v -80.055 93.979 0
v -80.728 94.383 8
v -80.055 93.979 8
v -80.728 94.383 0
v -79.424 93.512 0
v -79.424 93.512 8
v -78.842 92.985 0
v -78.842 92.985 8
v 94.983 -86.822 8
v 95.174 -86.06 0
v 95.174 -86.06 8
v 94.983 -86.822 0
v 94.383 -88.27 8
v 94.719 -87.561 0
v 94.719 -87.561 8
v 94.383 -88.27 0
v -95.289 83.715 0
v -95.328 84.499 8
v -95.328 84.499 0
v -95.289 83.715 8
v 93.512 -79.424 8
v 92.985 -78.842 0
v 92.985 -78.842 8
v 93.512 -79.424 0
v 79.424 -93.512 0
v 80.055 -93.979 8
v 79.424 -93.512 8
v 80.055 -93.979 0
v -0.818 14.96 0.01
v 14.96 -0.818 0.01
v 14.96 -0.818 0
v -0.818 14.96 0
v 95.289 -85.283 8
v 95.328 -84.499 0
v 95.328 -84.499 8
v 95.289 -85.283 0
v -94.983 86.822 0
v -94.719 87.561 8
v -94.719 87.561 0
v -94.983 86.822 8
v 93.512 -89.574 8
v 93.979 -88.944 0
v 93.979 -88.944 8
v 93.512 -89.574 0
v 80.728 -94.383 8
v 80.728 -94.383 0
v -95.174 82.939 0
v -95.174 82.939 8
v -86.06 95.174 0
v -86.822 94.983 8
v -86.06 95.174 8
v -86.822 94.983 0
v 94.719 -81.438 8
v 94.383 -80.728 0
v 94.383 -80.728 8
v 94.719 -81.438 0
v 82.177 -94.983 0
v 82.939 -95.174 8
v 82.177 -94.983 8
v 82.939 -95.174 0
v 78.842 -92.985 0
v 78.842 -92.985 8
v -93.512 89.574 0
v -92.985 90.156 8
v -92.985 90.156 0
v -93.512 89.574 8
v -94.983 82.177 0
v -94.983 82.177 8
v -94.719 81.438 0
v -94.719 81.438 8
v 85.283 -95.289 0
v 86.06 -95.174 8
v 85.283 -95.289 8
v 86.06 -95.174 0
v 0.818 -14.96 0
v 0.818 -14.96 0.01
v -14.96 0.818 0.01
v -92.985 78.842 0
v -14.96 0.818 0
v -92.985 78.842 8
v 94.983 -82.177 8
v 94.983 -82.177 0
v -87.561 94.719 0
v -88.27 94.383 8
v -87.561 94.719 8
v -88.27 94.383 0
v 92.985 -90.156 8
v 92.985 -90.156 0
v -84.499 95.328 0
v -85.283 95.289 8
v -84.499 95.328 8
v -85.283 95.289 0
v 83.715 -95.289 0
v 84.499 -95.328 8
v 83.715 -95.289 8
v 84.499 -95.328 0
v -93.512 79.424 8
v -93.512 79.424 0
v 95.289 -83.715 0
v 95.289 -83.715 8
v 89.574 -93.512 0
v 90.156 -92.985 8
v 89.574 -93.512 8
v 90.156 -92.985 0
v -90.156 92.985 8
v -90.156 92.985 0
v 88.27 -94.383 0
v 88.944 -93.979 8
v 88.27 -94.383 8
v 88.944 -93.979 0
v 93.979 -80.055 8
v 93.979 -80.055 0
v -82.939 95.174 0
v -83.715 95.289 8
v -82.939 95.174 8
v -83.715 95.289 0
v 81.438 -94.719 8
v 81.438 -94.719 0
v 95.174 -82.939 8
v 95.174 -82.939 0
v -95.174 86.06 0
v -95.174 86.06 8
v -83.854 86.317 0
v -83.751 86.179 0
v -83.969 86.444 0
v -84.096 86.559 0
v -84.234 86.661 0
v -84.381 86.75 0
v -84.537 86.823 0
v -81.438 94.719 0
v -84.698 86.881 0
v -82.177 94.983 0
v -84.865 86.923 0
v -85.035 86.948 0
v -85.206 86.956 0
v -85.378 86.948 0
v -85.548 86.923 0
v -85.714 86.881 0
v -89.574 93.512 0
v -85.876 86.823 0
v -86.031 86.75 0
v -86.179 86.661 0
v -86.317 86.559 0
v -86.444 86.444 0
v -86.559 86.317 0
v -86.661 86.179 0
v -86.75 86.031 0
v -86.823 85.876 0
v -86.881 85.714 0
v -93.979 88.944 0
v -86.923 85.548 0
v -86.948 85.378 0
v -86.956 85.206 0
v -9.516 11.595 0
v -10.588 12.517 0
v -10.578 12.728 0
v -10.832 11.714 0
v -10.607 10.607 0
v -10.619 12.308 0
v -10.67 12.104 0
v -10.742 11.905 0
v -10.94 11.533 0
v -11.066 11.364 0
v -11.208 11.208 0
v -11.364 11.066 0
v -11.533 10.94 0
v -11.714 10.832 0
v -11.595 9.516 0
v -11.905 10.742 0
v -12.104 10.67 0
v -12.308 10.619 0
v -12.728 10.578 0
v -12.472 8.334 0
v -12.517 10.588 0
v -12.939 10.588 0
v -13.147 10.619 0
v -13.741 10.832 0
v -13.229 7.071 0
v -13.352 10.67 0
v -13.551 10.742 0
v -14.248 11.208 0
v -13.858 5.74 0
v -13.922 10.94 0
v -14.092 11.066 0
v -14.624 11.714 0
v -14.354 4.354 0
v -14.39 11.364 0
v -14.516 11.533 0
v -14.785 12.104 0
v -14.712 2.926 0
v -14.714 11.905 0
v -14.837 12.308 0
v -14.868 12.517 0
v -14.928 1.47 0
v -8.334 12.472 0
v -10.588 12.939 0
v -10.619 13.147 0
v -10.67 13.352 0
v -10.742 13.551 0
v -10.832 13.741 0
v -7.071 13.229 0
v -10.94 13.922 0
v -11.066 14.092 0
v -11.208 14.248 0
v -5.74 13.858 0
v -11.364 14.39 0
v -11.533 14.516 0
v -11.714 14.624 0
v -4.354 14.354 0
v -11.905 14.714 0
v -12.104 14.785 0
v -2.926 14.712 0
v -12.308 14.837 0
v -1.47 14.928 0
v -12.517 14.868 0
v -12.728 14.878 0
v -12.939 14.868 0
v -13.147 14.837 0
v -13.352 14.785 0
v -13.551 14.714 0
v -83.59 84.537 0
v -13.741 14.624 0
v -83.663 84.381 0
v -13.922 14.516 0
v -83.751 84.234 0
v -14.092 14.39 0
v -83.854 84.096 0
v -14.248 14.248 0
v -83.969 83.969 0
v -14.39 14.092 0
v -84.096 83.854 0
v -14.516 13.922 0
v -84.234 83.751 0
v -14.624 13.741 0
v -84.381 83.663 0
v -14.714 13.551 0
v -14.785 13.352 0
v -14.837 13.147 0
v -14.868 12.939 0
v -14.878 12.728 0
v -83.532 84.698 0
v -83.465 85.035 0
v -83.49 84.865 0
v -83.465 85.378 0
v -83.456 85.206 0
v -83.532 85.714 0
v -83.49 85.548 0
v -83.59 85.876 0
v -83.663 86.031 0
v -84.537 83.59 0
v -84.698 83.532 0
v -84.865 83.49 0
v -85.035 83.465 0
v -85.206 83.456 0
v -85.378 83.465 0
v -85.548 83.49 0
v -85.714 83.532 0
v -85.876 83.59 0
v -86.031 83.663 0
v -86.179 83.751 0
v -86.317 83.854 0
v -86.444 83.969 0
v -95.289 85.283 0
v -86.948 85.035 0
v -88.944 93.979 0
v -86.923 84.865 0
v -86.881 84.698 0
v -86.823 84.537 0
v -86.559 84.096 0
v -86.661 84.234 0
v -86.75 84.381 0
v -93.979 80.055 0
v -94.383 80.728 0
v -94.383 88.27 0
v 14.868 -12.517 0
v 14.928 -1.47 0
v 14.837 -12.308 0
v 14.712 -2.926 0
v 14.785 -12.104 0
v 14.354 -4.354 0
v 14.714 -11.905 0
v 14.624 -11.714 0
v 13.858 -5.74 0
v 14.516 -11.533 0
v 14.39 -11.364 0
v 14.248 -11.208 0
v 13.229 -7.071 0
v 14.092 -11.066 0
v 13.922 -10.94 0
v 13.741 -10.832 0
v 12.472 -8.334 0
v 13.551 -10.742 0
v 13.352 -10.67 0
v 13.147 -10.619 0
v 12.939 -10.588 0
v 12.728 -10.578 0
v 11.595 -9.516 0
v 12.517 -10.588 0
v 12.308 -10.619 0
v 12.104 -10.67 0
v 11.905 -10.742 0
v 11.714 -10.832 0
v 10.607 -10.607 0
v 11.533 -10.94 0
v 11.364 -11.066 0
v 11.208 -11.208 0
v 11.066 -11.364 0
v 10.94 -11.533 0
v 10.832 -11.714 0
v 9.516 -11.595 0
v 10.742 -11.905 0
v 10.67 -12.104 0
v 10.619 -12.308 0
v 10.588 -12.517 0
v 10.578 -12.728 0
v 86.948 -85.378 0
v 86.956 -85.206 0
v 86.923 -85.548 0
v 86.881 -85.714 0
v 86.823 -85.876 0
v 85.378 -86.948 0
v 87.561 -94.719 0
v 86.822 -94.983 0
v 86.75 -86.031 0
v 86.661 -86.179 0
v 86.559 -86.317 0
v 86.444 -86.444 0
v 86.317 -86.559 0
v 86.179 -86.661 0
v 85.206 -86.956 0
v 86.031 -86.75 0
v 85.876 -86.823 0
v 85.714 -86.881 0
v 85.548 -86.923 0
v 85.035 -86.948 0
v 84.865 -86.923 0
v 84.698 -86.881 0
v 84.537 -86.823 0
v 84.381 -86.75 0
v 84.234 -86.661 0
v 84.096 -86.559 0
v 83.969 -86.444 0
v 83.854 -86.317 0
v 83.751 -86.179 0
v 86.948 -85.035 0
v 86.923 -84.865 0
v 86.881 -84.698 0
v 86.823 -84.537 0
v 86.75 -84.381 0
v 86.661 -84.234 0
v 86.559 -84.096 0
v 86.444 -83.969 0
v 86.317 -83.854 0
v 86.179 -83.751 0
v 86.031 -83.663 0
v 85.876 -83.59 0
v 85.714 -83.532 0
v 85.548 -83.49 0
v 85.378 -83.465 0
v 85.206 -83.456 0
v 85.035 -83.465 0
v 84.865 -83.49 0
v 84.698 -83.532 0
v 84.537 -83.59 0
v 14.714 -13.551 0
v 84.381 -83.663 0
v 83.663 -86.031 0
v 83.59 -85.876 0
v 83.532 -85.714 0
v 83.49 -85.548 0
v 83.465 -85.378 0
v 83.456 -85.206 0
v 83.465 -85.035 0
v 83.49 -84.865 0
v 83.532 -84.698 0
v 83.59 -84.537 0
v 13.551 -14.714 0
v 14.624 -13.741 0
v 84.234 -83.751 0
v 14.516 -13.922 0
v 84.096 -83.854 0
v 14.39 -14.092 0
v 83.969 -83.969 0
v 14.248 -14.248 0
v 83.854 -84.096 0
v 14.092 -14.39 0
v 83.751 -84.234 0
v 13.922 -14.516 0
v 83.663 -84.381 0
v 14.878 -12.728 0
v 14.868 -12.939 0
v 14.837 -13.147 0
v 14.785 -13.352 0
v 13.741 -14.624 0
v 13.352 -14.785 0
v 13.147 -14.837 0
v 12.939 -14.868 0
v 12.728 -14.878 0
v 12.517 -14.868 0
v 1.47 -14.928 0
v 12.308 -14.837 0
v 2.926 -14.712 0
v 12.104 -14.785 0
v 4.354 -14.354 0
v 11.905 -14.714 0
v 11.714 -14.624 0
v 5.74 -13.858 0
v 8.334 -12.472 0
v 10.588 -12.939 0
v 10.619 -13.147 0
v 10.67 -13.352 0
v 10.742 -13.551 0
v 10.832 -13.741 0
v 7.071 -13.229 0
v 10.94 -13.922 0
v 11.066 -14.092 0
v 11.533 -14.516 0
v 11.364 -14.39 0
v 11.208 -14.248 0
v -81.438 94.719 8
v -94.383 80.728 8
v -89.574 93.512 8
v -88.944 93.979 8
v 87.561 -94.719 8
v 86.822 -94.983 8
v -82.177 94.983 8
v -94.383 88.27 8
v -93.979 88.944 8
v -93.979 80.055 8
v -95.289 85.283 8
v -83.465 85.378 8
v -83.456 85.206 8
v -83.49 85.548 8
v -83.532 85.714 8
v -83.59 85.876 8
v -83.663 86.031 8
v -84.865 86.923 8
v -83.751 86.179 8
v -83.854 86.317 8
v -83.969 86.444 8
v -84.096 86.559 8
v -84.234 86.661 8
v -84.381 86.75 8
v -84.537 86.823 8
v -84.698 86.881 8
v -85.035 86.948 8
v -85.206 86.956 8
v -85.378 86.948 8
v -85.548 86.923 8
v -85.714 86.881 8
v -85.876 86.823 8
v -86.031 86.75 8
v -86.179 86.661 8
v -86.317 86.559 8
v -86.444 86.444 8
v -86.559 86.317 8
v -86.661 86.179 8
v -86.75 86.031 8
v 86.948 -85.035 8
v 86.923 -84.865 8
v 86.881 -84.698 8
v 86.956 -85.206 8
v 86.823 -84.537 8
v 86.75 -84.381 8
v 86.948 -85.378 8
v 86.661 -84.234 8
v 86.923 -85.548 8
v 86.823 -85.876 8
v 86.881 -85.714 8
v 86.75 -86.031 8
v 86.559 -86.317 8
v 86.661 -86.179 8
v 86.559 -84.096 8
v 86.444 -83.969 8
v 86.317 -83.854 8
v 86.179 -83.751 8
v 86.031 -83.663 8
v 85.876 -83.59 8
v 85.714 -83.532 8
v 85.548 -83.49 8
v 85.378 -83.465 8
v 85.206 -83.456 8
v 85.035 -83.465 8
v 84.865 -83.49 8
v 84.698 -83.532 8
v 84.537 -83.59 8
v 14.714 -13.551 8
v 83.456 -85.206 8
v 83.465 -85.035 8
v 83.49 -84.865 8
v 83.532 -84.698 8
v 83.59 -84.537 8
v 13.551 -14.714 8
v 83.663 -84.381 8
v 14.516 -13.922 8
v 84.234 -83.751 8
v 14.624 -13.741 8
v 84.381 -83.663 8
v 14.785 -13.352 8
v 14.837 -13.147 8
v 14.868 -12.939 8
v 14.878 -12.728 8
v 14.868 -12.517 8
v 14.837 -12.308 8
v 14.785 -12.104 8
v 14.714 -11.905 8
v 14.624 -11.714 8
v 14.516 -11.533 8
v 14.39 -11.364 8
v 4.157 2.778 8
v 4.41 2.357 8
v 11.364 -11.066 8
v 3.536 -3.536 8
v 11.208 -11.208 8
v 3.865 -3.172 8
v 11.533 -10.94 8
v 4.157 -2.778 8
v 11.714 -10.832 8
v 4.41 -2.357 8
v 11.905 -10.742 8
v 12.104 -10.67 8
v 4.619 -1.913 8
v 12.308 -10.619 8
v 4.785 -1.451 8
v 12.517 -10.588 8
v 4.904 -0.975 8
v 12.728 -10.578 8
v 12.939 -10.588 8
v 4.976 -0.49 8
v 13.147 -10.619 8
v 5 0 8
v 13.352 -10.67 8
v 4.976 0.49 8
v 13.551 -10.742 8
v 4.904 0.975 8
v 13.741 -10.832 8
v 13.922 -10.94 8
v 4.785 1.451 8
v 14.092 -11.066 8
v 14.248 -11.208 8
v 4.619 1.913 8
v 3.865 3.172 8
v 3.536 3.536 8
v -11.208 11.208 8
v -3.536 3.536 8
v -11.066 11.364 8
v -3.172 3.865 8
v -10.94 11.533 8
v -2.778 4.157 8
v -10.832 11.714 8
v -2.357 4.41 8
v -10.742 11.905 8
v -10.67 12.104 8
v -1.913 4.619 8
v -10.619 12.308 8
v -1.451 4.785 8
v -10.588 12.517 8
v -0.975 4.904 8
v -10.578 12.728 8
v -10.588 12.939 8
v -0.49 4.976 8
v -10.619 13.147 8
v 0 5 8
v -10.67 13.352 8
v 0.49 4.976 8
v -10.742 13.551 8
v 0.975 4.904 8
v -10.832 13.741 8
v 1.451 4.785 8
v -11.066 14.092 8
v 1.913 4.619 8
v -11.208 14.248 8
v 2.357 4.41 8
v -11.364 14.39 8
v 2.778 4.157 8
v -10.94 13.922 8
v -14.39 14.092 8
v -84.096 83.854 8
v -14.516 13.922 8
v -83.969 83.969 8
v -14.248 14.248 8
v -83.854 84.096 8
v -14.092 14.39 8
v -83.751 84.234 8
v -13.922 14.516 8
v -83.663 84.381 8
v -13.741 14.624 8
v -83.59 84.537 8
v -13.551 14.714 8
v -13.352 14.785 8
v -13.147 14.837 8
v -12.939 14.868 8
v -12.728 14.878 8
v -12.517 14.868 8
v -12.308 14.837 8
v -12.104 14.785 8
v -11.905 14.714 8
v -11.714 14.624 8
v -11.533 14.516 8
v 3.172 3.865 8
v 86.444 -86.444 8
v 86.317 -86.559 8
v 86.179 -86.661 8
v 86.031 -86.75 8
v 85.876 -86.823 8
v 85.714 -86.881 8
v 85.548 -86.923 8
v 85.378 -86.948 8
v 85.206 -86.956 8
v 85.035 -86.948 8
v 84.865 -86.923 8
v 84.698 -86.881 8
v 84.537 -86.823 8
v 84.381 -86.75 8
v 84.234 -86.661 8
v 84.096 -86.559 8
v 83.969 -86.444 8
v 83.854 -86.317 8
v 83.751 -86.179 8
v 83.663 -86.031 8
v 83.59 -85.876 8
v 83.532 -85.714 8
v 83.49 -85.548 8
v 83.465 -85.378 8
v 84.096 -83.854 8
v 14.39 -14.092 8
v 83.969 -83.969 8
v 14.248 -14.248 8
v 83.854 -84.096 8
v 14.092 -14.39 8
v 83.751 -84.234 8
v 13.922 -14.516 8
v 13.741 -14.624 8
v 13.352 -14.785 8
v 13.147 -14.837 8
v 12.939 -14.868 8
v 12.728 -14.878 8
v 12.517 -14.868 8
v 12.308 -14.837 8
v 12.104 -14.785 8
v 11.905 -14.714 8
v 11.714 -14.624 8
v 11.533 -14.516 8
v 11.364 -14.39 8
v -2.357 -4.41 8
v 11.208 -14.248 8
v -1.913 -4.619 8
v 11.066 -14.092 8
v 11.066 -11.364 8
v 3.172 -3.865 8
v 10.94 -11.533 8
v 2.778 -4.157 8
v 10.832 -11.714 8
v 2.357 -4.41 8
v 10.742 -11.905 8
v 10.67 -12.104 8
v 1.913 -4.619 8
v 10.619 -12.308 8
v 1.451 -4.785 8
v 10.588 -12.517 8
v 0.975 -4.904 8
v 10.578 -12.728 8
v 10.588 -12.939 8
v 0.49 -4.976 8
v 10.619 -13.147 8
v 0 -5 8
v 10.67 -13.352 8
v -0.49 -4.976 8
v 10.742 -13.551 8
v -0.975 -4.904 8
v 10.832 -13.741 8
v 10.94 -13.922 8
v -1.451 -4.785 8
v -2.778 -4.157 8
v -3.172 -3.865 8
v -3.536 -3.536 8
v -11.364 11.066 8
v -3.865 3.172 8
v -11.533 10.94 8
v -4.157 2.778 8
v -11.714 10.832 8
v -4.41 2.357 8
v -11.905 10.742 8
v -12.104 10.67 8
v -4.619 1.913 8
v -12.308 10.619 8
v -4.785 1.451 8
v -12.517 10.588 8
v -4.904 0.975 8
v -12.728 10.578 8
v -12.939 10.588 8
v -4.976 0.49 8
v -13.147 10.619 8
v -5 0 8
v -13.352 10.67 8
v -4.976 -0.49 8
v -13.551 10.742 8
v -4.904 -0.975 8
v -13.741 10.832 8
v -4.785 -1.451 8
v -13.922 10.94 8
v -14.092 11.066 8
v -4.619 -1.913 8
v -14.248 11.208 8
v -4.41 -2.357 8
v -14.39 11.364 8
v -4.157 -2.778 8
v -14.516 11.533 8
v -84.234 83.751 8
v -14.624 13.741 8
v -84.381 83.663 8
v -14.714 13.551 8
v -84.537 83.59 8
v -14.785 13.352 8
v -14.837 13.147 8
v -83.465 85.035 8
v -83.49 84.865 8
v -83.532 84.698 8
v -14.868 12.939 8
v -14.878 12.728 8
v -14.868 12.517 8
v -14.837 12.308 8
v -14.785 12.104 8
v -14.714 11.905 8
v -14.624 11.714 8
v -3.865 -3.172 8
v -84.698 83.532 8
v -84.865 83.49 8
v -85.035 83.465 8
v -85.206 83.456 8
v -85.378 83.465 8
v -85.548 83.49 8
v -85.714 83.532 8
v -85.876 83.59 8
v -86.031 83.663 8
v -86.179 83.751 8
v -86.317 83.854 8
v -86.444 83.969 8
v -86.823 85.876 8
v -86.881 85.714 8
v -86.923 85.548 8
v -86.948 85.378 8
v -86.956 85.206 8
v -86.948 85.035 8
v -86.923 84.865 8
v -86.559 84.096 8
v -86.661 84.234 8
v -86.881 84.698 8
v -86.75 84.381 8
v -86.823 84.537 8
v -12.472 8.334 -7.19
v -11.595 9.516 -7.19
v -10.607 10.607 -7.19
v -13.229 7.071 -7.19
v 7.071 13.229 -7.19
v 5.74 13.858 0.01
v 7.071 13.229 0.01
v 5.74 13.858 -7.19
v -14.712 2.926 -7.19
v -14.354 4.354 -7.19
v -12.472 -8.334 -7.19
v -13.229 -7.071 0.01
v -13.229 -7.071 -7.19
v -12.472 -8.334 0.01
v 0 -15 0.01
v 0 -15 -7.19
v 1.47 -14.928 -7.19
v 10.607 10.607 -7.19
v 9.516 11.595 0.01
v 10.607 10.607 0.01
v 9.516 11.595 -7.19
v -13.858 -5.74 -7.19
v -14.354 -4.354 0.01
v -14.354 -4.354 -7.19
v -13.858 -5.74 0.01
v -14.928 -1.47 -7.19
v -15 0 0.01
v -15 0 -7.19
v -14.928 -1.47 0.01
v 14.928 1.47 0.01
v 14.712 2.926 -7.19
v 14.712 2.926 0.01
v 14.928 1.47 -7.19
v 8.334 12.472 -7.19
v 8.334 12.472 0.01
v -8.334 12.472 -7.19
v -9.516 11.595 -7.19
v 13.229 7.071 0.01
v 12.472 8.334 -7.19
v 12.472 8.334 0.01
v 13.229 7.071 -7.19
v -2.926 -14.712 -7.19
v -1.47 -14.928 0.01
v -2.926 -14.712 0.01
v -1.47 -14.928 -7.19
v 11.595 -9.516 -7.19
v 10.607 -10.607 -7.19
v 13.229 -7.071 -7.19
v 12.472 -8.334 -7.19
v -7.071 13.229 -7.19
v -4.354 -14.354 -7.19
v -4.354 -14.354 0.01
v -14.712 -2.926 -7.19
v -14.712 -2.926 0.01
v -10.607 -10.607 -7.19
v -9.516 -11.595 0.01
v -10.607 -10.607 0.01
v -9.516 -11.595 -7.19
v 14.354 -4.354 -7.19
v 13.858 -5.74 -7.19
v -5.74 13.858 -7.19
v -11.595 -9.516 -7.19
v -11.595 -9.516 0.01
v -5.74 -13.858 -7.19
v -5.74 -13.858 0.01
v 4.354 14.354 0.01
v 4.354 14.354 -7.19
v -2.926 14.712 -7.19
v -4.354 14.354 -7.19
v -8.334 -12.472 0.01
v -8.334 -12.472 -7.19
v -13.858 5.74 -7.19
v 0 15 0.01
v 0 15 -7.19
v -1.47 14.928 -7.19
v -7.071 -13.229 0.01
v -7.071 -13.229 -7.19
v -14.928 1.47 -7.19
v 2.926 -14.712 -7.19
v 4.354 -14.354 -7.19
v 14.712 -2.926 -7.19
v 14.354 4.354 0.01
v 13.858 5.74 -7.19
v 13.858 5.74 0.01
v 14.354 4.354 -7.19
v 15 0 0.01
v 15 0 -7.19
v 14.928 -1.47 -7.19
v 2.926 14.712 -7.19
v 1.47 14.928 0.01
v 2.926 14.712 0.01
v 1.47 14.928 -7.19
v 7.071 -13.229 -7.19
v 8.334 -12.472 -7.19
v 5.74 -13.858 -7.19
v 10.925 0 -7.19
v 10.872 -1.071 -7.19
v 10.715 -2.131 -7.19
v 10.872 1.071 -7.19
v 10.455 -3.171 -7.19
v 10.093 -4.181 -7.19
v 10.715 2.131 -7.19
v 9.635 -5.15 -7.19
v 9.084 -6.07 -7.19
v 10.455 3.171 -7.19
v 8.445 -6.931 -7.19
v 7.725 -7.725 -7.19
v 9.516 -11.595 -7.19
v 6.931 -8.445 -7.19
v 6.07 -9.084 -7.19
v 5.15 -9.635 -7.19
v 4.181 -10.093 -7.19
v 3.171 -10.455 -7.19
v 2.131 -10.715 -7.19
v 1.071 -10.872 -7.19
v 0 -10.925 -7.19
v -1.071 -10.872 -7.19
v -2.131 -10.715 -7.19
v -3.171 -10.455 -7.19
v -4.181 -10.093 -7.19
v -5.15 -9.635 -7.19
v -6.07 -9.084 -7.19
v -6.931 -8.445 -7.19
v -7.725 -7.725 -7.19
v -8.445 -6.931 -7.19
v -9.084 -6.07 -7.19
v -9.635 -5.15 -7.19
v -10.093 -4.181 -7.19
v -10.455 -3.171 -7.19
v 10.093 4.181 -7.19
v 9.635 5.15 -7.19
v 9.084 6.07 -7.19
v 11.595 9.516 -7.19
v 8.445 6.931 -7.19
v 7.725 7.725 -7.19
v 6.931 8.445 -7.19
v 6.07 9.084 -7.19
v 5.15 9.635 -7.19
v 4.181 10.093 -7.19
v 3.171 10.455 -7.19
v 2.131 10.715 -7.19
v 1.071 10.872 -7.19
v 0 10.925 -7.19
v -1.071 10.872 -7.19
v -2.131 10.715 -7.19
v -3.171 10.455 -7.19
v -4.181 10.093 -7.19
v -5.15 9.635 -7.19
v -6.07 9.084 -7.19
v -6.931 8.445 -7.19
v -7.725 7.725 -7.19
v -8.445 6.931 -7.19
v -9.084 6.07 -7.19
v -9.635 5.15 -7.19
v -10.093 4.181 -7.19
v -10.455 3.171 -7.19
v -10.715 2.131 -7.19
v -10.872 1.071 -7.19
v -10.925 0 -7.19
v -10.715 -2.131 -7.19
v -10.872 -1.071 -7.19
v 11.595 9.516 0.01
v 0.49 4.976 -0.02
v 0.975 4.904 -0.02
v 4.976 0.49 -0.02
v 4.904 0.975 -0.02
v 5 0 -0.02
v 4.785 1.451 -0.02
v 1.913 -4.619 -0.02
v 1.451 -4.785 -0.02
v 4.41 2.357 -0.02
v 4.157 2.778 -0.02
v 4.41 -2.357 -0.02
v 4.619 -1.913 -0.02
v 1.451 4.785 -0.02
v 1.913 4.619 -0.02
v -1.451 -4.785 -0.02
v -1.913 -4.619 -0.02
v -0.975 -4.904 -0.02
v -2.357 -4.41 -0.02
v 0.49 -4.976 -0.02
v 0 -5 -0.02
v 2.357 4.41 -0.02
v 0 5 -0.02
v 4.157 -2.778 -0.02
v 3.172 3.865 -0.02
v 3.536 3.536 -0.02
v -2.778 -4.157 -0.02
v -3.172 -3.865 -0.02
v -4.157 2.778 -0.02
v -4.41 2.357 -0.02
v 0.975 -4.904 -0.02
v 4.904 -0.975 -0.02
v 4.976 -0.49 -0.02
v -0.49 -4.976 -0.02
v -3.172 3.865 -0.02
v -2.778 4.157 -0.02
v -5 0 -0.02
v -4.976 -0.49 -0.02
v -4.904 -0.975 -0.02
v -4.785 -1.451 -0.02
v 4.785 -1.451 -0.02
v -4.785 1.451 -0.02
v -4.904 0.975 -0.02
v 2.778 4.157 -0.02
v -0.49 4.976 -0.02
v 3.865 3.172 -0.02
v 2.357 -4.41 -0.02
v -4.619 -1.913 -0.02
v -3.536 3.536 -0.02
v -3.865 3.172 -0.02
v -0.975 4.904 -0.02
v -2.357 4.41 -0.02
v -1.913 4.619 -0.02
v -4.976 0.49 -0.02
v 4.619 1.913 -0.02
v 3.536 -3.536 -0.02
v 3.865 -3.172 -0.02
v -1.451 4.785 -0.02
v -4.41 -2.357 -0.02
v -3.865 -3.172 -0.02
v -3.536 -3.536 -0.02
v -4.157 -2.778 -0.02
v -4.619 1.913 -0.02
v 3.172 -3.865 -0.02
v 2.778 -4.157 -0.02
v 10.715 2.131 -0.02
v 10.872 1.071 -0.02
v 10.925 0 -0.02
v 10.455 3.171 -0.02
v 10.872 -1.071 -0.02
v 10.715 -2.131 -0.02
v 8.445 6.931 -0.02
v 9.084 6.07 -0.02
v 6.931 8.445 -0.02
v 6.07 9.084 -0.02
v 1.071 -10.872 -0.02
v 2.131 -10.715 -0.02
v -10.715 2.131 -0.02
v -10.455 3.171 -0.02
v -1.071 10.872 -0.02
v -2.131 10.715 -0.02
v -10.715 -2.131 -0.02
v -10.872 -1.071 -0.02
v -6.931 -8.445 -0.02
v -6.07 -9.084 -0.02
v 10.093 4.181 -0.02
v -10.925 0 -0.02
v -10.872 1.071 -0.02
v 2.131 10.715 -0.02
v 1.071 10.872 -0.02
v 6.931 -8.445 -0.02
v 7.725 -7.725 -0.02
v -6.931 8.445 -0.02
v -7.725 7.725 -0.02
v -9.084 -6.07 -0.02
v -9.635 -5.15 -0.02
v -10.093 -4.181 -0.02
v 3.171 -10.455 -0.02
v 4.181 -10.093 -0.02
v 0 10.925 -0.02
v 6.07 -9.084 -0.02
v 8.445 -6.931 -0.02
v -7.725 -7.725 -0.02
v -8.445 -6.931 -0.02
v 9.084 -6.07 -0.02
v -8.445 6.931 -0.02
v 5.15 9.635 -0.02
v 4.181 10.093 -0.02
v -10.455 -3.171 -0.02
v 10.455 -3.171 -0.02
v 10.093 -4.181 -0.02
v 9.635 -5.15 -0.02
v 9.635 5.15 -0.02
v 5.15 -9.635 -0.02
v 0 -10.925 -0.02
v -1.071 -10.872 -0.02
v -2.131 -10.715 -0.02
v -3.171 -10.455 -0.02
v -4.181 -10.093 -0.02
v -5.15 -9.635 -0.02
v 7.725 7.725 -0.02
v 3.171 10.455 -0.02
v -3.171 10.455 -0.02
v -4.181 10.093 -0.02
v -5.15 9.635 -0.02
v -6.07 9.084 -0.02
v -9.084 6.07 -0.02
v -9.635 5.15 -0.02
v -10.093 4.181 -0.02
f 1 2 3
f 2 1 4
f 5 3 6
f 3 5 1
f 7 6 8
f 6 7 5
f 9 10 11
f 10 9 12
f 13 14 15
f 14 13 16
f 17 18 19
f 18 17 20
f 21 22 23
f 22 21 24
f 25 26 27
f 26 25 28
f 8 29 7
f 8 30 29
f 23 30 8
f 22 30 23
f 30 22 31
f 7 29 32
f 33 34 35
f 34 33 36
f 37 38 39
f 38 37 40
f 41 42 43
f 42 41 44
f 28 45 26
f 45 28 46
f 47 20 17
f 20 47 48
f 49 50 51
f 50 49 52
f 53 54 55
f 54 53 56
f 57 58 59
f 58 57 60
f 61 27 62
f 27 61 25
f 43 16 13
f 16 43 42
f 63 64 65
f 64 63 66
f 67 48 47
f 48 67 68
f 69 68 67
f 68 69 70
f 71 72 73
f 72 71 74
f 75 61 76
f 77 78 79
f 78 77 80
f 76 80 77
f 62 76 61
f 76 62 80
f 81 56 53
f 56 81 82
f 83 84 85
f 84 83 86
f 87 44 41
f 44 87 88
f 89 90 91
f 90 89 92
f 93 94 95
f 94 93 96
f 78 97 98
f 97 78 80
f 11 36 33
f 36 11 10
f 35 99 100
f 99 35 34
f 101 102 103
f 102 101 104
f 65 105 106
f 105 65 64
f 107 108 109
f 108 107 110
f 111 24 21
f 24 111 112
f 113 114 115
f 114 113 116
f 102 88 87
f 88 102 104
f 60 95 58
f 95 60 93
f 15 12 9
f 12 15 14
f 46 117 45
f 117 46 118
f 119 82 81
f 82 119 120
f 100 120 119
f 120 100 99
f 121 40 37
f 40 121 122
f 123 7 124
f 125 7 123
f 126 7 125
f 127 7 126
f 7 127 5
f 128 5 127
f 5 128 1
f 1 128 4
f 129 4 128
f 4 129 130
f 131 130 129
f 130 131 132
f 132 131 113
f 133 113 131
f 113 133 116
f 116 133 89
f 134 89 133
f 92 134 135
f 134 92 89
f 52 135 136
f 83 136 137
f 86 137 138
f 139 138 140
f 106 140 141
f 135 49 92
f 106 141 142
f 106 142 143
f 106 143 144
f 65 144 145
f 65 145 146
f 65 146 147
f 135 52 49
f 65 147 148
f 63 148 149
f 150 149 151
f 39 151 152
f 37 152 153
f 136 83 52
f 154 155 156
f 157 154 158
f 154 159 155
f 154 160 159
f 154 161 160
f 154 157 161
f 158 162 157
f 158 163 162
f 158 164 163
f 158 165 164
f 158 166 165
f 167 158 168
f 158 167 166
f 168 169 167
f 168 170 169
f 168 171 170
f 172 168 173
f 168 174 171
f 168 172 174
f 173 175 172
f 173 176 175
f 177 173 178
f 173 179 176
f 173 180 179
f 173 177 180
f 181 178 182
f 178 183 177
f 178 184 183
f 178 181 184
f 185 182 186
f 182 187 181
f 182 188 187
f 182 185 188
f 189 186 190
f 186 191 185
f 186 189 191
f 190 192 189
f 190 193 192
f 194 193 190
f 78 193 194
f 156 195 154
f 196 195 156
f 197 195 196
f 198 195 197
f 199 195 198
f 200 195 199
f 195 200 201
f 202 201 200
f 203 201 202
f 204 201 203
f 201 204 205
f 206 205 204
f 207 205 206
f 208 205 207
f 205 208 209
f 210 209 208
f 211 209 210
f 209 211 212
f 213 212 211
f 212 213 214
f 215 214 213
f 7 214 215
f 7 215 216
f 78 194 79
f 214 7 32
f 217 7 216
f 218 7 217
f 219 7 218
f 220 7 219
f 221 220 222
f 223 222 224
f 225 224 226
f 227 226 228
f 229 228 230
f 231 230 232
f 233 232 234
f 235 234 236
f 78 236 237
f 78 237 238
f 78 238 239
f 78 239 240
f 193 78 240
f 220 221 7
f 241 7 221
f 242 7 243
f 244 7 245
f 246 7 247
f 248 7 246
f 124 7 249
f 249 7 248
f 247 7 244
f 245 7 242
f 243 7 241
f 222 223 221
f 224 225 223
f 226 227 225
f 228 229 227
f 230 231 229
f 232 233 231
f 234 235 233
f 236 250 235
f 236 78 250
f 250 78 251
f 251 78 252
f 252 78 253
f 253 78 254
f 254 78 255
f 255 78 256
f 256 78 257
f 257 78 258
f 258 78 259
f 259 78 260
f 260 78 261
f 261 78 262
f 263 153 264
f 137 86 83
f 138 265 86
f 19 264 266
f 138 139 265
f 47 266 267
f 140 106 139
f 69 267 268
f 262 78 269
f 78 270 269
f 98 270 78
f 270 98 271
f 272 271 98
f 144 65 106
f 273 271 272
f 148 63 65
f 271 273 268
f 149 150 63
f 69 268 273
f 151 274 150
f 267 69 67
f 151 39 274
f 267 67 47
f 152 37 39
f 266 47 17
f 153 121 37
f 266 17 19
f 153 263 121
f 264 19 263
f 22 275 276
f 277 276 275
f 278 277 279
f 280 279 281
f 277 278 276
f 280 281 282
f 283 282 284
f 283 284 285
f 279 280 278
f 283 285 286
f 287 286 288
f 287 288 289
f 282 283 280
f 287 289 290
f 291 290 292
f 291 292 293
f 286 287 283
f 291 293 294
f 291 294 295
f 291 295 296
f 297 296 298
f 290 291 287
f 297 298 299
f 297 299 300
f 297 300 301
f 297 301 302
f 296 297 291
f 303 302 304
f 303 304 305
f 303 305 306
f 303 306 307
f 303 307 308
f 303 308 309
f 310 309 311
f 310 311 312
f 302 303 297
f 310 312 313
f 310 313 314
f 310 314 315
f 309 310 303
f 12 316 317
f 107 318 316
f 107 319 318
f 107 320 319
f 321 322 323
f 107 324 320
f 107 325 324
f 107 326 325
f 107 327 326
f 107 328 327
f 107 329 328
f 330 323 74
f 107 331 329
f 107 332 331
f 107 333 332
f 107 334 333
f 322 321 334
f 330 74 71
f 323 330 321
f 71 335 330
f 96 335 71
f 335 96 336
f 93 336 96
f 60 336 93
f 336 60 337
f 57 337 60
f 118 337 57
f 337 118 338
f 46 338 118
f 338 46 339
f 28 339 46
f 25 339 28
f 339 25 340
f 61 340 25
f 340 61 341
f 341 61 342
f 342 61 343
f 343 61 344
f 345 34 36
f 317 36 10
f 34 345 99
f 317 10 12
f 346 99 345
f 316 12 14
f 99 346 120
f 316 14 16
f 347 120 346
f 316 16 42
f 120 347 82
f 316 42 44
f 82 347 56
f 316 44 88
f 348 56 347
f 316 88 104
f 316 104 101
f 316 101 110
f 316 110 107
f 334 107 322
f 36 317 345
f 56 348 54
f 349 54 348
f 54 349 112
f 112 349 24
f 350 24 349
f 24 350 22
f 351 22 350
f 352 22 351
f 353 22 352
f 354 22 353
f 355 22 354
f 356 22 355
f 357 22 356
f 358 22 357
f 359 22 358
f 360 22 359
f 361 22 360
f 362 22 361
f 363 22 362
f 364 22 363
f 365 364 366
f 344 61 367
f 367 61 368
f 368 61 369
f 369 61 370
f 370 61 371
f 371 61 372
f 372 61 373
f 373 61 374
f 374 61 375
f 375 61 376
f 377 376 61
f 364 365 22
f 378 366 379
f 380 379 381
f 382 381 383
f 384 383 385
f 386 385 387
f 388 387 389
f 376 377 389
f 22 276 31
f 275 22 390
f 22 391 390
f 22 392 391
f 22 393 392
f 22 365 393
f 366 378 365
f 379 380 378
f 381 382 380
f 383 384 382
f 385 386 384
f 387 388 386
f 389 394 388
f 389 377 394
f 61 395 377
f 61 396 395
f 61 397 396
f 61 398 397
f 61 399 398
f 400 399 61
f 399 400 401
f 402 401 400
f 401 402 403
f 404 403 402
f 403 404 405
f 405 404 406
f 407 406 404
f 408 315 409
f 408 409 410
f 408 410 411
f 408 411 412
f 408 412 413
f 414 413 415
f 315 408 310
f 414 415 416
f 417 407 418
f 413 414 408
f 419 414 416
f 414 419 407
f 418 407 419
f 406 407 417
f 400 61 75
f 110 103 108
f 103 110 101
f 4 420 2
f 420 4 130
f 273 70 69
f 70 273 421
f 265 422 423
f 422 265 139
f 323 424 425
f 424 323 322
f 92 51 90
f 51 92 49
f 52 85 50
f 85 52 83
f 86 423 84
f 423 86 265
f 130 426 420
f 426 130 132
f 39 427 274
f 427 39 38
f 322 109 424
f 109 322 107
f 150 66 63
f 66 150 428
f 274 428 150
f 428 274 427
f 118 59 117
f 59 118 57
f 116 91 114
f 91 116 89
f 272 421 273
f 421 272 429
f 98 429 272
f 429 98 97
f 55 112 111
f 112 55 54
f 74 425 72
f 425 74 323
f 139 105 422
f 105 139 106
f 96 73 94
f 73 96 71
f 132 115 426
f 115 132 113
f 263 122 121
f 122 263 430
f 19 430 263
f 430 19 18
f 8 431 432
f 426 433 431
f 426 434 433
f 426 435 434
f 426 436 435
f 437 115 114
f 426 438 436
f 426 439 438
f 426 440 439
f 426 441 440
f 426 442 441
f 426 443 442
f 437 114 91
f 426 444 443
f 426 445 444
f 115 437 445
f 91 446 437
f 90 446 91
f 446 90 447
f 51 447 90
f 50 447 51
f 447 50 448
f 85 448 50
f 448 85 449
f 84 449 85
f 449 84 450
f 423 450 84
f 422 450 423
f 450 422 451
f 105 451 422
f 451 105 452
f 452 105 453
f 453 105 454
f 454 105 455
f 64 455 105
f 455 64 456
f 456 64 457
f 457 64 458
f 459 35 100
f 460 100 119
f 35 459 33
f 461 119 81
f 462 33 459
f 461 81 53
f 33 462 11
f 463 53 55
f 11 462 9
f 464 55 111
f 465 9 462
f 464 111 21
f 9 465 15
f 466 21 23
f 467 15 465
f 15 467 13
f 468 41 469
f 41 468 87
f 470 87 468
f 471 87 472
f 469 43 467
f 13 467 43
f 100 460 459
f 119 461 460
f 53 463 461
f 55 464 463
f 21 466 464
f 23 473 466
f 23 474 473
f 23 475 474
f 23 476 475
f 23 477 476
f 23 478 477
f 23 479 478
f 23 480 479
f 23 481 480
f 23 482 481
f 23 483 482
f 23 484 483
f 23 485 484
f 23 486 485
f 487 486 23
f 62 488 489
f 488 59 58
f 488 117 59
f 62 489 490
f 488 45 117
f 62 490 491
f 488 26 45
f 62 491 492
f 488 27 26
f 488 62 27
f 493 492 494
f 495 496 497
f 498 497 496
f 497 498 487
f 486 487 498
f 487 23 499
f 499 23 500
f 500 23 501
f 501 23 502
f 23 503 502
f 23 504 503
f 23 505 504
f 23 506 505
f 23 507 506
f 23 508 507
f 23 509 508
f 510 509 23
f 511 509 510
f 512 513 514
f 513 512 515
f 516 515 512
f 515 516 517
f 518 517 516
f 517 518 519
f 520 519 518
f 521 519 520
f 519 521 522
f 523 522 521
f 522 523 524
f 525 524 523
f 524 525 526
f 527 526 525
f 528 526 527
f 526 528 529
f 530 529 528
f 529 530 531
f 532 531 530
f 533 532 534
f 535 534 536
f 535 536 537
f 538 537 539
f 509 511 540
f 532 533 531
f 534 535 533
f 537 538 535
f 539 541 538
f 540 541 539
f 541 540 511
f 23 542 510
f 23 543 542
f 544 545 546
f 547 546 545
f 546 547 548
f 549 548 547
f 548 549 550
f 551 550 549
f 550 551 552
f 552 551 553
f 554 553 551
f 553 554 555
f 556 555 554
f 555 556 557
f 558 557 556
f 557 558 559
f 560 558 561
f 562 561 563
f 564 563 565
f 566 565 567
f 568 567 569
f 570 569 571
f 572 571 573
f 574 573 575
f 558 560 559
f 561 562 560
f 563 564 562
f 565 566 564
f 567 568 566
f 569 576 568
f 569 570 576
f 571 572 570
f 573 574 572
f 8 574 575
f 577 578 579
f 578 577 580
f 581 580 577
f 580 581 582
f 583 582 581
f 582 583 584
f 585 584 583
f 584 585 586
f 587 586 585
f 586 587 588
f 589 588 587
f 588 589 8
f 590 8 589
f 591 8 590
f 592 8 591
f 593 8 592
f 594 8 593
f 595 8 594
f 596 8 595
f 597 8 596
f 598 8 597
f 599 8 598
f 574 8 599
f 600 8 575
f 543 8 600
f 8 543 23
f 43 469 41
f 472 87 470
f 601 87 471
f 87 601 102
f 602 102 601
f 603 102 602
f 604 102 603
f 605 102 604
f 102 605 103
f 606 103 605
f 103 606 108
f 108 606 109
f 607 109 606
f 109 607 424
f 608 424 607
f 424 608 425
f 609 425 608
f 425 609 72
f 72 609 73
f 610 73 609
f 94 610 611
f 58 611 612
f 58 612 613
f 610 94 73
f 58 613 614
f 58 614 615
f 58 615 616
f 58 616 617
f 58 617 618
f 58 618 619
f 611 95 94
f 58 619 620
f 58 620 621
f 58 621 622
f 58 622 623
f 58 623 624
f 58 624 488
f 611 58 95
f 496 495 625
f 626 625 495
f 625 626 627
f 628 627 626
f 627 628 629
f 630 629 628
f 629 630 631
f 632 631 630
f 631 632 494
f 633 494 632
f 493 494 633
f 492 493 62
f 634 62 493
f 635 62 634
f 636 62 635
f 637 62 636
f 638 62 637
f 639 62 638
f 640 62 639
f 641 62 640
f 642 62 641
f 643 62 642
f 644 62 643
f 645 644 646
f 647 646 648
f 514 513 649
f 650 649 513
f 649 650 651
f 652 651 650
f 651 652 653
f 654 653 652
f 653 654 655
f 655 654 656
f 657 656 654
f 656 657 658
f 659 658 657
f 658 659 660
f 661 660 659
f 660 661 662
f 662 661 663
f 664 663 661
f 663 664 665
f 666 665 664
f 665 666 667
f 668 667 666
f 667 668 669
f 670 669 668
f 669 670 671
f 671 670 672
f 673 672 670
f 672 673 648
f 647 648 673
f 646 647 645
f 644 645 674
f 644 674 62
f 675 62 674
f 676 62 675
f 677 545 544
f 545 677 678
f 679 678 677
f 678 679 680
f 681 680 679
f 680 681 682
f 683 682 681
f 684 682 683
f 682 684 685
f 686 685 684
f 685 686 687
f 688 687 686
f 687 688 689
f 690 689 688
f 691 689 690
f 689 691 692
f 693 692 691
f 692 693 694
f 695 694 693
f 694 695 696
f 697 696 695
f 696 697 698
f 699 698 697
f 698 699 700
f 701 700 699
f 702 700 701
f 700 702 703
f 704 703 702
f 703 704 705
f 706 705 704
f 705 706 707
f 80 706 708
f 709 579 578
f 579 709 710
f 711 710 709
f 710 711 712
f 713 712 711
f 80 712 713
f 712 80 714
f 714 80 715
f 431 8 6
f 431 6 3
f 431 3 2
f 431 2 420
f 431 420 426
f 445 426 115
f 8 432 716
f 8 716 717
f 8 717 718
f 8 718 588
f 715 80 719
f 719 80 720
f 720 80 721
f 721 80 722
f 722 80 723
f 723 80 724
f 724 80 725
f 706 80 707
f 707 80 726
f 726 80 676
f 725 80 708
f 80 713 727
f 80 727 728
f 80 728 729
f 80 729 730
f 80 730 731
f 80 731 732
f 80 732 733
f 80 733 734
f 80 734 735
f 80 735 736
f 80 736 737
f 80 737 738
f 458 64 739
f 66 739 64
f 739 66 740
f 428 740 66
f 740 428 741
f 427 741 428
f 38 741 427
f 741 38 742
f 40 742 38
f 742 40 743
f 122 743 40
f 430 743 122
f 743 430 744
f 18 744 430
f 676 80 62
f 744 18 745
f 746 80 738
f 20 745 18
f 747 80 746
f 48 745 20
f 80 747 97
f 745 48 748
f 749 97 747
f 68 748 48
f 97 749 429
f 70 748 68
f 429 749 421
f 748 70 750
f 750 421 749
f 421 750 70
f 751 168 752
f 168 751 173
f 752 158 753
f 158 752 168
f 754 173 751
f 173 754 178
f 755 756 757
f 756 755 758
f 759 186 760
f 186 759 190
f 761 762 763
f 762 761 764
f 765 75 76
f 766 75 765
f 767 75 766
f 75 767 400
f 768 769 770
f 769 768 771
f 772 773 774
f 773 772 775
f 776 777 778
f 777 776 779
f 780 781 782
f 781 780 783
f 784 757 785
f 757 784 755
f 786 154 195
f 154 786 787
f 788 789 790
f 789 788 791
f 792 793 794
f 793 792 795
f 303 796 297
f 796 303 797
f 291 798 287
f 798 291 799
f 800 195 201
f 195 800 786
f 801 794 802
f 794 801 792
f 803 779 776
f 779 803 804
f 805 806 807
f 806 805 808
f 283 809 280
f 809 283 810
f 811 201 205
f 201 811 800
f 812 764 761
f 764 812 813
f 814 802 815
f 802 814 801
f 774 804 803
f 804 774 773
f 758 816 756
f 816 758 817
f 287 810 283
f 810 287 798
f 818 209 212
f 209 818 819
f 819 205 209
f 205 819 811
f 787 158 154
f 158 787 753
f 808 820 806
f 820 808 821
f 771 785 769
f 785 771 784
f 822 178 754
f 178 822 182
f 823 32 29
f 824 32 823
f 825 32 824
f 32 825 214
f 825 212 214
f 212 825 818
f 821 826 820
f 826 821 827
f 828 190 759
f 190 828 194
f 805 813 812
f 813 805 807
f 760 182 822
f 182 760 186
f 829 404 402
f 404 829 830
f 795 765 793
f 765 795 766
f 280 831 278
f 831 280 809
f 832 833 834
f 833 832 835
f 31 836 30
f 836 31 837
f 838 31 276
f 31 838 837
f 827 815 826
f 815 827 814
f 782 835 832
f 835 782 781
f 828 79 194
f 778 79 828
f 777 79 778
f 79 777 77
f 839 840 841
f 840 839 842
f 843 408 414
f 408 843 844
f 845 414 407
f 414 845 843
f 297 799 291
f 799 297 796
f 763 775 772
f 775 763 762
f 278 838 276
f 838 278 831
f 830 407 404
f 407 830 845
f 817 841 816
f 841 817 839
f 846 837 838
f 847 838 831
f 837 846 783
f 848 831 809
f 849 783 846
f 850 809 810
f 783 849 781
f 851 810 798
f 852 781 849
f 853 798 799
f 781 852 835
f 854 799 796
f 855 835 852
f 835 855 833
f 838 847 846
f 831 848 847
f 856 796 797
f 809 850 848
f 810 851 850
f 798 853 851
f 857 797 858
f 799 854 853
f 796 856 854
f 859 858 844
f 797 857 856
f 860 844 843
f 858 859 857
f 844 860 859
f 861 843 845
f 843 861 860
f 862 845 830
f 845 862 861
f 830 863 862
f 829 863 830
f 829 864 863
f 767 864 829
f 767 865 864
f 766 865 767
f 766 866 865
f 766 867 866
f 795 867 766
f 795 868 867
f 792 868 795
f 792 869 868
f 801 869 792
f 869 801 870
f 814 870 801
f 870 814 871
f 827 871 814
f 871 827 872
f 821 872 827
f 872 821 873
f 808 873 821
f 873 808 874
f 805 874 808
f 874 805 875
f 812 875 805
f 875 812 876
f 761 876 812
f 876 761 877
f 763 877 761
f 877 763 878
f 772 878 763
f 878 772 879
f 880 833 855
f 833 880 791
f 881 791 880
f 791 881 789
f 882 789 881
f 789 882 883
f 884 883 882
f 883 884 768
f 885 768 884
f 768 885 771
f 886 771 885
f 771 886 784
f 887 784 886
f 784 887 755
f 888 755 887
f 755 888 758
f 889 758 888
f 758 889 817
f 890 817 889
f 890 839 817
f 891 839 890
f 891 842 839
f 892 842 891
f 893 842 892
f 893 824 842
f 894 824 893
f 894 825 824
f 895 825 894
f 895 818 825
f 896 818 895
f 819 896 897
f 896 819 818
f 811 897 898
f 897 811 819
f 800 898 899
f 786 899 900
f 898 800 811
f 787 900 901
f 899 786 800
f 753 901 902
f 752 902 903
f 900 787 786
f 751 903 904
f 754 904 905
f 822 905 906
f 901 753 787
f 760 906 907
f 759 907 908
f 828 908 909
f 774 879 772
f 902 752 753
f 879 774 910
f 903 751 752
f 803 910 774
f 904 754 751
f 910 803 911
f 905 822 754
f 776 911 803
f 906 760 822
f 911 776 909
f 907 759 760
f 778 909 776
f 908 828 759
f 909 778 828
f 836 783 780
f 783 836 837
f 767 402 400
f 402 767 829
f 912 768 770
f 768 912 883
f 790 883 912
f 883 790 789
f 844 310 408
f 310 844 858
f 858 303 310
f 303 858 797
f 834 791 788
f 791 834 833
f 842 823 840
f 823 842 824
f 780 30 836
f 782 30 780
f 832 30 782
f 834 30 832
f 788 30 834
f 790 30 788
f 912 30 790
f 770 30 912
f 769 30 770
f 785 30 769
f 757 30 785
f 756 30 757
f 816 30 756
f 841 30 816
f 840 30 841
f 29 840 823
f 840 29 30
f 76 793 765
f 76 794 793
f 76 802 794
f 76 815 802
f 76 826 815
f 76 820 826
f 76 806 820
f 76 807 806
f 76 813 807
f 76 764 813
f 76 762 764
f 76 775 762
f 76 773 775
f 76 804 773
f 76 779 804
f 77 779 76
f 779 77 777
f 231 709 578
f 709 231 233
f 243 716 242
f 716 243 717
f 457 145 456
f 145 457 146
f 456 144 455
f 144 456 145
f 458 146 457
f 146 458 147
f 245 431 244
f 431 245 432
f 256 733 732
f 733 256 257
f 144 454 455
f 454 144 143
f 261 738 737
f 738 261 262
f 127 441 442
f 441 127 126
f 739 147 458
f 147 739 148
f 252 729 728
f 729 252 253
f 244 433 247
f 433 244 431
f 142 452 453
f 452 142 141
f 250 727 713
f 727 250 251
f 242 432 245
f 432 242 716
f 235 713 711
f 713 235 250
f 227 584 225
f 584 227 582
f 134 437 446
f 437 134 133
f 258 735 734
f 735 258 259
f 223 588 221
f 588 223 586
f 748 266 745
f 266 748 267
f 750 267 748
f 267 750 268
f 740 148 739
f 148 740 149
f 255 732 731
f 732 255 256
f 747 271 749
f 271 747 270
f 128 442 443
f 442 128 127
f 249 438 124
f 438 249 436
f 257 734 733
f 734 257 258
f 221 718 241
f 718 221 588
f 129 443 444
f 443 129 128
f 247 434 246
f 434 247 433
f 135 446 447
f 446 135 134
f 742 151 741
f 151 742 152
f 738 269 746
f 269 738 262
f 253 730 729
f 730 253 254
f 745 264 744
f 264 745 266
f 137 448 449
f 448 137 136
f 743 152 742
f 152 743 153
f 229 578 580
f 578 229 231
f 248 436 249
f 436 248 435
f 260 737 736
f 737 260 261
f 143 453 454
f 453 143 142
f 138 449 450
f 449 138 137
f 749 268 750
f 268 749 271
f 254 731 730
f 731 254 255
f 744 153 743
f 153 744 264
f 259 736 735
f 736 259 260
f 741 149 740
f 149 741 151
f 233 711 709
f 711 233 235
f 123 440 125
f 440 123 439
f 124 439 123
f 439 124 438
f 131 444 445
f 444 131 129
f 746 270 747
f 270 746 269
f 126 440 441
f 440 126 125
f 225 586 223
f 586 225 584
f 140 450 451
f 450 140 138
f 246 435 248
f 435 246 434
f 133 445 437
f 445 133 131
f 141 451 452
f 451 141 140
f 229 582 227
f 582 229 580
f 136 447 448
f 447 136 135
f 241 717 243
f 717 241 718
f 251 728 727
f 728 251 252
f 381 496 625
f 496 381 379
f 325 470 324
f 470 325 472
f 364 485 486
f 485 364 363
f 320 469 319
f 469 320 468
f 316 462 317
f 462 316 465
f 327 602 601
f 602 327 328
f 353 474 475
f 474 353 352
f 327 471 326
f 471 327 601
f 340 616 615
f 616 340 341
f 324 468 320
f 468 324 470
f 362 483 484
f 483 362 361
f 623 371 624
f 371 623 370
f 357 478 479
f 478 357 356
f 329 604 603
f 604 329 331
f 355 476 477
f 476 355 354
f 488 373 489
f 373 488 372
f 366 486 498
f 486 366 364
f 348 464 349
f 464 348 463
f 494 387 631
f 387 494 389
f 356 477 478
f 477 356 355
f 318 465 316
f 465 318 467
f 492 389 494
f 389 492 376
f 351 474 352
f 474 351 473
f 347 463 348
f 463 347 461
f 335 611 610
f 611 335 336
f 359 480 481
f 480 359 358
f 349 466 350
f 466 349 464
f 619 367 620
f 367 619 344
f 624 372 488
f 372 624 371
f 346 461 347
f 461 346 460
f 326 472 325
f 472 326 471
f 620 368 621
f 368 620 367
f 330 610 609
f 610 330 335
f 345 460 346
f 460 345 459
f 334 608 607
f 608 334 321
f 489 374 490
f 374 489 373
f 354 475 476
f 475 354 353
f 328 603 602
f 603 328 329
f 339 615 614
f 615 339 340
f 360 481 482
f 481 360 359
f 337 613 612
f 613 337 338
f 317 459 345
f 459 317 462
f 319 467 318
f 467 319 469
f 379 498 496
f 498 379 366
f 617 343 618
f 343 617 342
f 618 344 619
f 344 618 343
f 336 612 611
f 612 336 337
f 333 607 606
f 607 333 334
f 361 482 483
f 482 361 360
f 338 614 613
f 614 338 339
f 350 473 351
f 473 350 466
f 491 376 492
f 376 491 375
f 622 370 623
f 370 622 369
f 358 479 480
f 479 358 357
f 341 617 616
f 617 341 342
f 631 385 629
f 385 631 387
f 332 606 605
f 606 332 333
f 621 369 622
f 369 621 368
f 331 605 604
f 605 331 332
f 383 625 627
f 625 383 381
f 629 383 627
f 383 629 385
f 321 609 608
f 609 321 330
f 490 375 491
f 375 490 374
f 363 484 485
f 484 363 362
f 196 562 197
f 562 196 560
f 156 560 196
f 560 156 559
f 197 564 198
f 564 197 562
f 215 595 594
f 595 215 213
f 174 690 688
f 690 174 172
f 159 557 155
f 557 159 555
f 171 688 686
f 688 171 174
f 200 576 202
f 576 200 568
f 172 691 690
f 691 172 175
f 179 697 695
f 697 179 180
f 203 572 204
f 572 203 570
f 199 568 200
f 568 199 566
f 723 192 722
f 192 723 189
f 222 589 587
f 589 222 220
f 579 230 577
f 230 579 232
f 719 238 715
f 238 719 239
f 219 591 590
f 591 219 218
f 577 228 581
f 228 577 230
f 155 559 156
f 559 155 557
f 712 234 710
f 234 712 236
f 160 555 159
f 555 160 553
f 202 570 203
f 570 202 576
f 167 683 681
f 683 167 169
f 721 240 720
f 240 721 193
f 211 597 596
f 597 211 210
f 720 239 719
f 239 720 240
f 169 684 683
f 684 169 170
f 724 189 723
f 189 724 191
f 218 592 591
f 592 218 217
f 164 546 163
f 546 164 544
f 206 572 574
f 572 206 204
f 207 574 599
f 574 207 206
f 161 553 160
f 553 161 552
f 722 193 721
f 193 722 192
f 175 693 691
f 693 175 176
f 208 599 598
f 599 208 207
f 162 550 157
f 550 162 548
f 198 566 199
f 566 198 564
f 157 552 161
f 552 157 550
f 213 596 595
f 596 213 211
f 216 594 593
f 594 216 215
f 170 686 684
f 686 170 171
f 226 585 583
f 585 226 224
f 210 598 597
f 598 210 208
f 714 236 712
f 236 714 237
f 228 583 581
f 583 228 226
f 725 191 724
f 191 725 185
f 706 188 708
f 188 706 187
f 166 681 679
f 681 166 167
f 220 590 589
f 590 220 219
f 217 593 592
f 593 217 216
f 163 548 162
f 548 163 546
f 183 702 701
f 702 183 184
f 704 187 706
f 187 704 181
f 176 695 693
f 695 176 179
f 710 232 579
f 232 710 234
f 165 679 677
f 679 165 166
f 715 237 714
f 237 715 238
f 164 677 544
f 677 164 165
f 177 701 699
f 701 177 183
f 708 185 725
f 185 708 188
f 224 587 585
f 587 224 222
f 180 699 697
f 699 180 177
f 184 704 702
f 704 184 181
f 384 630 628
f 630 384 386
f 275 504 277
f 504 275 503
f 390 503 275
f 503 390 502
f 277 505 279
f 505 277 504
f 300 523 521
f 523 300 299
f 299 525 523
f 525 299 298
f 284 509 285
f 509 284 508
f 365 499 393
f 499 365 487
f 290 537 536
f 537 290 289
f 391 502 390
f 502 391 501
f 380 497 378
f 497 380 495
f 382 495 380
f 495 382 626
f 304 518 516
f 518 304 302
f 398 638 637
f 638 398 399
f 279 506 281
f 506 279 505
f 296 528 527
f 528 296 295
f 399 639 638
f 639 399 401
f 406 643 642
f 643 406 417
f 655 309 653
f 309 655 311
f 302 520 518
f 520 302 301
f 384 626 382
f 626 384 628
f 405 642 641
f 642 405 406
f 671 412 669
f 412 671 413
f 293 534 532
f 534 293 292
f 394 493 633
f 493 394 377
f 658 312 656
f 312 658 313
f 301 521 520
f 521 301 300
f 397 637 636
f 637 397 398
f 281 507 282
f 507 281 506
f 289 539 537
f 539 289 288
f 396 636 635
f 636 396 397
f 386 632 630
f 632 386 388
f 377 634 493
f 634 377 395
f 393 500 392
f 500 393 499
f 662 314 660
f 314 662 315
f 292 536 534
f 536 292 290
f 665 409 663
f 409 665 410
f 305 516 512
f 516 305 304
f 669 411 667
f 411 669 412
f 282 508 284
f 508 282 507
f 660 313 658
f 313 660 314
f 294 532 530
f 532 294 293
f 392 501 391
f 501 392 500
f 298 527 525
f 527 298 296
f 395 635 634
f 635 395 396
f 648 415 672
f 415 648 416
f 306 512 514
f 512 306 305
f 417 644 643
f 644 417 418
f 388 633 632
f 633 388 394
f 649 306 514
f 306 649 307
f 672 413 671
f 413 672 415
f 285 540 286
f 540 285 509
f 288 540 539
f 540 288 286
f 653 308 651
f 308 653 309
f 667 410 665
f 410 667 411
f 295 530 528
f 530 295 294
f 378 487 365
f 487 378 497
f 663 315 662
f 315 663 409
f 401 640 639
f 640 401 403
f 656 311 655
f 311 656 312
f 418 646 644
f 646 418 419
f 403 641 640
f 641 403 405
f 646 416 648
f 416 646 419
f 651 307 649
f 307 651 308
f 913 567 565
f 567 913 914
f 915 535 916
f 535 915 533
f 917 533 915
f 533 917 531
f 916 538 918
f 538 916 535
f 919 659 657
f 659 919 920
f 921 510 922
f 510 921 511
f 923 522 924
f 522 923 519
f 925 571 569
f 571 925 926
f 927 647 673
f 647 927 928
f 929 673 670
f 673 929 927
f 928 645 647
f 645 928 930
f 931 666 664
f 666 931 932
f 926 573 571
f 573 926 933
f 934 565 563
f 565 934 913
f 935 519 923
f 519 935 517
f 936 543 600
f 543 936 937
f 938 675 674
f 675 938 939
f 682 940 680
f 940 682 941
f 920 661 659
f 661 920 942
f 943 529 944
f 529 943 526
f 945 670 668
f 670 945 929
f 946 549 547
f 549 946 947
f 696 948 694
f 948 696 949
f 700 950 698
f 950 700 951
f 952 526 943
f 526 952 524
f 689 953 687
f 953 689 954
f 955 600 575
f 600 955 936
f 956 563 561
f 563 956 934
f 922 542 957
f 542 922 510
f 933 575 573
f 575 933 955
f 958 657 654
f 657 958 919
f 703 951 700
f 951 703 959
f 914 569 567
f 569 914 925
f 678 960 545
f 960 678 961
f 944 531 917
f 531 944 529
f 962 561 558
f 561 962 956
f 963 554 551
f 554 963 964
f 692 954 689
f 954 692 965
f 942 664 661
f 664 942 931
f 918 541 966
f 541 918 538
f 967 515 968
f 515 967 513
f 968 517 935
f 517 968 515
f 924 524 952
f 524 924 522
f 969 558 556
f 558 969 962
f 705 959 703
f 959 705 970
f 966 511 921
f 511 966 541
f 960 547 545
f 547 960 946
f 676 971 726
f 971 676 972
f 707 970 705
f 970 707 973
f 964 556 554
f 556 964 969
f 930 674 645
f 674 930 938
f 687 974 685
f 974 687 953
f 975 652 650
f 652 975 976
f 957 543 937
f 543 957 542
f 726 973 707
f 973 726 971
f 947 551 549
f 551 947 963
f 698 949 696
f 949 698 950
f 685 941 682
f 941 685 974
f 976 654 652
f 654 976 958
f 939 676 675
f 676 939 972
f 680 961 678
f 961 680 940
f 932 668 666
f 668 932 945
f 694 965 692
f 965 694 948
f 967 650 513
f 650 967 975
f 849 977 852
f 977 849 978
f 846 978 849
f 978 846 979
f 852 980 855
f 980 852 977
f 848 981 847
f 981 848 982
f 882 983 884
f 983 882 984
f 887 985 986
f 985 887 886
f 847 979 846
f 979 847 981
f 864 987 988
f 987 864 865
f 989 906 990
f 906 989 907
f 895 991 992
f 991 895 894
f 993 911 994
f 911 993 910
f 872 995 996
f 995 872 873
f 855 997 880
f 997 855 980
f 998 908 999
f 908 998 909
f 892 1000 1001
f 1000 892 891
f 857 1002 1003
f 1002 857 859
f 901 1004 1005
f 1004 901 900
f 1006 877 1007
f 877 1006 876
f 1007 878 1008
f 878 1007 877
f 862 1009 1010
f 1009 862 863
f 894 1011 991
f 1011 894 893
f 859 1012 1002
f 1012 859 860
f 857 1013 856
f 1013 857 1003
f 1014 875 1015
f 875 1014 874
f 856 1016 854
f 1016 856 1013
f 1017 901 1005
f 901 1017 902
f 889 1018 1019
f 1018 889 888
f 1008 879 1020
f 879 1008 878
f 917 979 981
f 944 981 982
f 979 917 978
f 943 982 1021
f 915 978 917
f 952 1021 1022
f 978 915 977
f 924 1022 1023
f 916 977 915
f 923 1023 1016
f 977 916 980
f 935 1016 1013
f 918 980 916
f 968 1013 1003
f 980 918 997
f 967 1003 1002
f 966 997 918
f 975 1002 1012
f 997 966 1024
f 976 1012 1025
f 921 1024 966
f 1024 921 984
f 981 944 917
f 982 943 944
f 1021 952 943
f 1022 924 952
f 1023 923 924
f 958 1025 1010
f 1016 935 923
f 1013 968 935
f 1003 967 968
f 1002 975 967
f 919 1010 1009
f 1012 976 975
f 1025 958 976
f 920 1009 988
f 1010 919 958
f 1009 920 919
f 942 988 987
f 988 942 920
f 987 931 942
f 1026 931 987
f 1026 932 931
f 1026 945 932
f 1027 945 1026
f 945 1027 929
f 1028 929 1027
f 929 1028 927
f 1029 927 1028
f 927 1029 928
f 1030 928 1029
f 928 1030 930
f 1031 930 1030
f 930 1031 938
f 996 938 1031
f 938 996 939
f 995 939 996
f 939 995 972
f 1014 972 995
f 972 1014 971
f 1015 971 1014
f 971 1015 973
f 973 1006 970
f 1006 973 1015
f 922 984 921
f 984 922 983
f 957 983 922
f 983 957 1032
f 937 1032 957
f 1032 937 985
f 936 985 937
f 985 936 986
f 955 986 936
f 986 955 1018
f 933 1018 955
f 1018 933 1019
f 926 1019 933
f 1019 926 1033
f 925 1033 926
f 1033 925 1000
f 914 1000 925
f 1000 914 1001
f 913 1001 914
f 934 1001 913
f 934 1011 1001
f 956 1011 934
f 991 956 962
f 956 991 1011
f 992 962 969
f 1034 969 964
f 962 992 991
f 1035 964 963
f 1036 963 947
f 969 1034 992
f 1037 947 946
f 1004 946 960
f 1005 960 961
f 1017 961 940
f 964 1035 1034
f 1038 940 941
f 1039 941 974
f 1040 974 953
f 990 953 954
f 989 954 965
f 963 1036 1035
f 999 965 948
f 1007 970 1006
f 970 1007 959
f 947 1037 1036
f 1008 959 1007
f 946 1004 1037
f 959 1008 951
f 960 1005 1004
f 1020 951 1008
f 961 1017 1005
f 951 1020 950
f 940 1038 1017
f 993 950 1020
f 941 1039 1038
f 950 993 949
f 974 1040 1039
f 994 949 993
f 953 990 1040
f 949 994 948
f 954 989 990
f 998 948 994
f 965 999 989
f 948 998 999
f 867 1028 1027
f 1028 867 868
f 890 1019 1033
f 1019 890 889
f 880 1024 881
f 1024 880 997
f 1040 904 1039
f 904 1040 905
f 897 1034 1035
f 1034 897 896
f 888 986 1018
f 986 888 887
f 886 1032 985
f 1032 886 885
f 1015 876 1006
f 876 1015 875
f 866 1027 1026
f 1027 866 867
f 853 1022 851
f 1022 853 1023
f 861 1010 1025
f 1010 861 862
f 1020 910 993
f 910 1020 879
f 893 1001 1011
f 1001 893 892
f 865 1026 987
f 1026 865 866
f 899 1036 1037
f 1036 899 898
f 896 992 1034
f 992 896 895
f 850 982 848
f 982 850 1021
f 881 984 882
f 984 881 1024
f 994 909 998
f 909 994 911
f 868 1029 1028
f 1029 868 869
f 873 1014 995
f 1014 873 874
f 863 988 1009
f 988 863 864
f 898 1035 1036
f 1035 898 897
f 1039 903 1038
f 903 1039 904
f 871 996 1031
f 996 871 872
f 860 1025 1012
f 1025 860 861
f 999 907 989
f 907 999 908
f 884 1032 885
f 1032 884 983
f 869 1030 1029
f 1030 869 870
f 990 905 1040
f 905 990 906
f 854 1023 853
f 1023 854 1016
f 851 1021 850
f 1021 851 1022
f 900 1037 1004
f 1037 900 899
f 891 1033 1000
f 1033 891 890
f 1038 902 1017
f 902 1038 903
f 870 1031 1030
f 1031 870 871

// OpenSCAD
// Gen-CZ — rear BEARING BRIDGE (bar endbell, 2026-10-10): a 608 boss on a 20 mm wide bar that spans the
// two frame rods at 135 deg and 135+180 deg (R = flange_bolt_r). The front bridge uses the rods at 45/225 deg, the rear
// bridge the rods at 135/315 deg, so the two bridges cross at 90 deg and the stator is held at 4 points.
// A bar instead of a full disc is what lets this big-ring kit fit ONE 410 mm plate. Print flat face DOWN (boss up, no supports).
// Brace holes (temporary M4 jack rods, R = brace_r) sit on the bar axis.
include <parameters.scad>;
$fn = 64;
bar_w = 20;
bar_len = 2 * (flange_bolt_r + 9);
module bar_2d() { offset(r=8) offset(delta=-8) square([bar_len, bar_w], center=true); }
difference() {
    rotate([0, 0, 135]) union() {
        linear_extrude(endbell_thick) bar_2d();
        translate([0, 0, -bearing_h + 0.01]) cylinder(d=30, h=bearing_h);
    }
    translate([0, 0, -bearing_h - 0.1]) cylinder(d=endbell_shaft_clear, h=50);
    translate([0, 0, -bearing_h - 0.02]) cylinder(d=bearing_d, h=bearing_h);
    for (s = [0, 180]) rotate([0, 0, 135 + s]) translate([flange_bolt_r, 0, -20]) cylinder(d=m3_clear, h=60);
    for (a = brace_angles) translate([brace_r*cos(a), brace_r*sin(a), -20]) cylinder(d=brace_d, h=50);
}
